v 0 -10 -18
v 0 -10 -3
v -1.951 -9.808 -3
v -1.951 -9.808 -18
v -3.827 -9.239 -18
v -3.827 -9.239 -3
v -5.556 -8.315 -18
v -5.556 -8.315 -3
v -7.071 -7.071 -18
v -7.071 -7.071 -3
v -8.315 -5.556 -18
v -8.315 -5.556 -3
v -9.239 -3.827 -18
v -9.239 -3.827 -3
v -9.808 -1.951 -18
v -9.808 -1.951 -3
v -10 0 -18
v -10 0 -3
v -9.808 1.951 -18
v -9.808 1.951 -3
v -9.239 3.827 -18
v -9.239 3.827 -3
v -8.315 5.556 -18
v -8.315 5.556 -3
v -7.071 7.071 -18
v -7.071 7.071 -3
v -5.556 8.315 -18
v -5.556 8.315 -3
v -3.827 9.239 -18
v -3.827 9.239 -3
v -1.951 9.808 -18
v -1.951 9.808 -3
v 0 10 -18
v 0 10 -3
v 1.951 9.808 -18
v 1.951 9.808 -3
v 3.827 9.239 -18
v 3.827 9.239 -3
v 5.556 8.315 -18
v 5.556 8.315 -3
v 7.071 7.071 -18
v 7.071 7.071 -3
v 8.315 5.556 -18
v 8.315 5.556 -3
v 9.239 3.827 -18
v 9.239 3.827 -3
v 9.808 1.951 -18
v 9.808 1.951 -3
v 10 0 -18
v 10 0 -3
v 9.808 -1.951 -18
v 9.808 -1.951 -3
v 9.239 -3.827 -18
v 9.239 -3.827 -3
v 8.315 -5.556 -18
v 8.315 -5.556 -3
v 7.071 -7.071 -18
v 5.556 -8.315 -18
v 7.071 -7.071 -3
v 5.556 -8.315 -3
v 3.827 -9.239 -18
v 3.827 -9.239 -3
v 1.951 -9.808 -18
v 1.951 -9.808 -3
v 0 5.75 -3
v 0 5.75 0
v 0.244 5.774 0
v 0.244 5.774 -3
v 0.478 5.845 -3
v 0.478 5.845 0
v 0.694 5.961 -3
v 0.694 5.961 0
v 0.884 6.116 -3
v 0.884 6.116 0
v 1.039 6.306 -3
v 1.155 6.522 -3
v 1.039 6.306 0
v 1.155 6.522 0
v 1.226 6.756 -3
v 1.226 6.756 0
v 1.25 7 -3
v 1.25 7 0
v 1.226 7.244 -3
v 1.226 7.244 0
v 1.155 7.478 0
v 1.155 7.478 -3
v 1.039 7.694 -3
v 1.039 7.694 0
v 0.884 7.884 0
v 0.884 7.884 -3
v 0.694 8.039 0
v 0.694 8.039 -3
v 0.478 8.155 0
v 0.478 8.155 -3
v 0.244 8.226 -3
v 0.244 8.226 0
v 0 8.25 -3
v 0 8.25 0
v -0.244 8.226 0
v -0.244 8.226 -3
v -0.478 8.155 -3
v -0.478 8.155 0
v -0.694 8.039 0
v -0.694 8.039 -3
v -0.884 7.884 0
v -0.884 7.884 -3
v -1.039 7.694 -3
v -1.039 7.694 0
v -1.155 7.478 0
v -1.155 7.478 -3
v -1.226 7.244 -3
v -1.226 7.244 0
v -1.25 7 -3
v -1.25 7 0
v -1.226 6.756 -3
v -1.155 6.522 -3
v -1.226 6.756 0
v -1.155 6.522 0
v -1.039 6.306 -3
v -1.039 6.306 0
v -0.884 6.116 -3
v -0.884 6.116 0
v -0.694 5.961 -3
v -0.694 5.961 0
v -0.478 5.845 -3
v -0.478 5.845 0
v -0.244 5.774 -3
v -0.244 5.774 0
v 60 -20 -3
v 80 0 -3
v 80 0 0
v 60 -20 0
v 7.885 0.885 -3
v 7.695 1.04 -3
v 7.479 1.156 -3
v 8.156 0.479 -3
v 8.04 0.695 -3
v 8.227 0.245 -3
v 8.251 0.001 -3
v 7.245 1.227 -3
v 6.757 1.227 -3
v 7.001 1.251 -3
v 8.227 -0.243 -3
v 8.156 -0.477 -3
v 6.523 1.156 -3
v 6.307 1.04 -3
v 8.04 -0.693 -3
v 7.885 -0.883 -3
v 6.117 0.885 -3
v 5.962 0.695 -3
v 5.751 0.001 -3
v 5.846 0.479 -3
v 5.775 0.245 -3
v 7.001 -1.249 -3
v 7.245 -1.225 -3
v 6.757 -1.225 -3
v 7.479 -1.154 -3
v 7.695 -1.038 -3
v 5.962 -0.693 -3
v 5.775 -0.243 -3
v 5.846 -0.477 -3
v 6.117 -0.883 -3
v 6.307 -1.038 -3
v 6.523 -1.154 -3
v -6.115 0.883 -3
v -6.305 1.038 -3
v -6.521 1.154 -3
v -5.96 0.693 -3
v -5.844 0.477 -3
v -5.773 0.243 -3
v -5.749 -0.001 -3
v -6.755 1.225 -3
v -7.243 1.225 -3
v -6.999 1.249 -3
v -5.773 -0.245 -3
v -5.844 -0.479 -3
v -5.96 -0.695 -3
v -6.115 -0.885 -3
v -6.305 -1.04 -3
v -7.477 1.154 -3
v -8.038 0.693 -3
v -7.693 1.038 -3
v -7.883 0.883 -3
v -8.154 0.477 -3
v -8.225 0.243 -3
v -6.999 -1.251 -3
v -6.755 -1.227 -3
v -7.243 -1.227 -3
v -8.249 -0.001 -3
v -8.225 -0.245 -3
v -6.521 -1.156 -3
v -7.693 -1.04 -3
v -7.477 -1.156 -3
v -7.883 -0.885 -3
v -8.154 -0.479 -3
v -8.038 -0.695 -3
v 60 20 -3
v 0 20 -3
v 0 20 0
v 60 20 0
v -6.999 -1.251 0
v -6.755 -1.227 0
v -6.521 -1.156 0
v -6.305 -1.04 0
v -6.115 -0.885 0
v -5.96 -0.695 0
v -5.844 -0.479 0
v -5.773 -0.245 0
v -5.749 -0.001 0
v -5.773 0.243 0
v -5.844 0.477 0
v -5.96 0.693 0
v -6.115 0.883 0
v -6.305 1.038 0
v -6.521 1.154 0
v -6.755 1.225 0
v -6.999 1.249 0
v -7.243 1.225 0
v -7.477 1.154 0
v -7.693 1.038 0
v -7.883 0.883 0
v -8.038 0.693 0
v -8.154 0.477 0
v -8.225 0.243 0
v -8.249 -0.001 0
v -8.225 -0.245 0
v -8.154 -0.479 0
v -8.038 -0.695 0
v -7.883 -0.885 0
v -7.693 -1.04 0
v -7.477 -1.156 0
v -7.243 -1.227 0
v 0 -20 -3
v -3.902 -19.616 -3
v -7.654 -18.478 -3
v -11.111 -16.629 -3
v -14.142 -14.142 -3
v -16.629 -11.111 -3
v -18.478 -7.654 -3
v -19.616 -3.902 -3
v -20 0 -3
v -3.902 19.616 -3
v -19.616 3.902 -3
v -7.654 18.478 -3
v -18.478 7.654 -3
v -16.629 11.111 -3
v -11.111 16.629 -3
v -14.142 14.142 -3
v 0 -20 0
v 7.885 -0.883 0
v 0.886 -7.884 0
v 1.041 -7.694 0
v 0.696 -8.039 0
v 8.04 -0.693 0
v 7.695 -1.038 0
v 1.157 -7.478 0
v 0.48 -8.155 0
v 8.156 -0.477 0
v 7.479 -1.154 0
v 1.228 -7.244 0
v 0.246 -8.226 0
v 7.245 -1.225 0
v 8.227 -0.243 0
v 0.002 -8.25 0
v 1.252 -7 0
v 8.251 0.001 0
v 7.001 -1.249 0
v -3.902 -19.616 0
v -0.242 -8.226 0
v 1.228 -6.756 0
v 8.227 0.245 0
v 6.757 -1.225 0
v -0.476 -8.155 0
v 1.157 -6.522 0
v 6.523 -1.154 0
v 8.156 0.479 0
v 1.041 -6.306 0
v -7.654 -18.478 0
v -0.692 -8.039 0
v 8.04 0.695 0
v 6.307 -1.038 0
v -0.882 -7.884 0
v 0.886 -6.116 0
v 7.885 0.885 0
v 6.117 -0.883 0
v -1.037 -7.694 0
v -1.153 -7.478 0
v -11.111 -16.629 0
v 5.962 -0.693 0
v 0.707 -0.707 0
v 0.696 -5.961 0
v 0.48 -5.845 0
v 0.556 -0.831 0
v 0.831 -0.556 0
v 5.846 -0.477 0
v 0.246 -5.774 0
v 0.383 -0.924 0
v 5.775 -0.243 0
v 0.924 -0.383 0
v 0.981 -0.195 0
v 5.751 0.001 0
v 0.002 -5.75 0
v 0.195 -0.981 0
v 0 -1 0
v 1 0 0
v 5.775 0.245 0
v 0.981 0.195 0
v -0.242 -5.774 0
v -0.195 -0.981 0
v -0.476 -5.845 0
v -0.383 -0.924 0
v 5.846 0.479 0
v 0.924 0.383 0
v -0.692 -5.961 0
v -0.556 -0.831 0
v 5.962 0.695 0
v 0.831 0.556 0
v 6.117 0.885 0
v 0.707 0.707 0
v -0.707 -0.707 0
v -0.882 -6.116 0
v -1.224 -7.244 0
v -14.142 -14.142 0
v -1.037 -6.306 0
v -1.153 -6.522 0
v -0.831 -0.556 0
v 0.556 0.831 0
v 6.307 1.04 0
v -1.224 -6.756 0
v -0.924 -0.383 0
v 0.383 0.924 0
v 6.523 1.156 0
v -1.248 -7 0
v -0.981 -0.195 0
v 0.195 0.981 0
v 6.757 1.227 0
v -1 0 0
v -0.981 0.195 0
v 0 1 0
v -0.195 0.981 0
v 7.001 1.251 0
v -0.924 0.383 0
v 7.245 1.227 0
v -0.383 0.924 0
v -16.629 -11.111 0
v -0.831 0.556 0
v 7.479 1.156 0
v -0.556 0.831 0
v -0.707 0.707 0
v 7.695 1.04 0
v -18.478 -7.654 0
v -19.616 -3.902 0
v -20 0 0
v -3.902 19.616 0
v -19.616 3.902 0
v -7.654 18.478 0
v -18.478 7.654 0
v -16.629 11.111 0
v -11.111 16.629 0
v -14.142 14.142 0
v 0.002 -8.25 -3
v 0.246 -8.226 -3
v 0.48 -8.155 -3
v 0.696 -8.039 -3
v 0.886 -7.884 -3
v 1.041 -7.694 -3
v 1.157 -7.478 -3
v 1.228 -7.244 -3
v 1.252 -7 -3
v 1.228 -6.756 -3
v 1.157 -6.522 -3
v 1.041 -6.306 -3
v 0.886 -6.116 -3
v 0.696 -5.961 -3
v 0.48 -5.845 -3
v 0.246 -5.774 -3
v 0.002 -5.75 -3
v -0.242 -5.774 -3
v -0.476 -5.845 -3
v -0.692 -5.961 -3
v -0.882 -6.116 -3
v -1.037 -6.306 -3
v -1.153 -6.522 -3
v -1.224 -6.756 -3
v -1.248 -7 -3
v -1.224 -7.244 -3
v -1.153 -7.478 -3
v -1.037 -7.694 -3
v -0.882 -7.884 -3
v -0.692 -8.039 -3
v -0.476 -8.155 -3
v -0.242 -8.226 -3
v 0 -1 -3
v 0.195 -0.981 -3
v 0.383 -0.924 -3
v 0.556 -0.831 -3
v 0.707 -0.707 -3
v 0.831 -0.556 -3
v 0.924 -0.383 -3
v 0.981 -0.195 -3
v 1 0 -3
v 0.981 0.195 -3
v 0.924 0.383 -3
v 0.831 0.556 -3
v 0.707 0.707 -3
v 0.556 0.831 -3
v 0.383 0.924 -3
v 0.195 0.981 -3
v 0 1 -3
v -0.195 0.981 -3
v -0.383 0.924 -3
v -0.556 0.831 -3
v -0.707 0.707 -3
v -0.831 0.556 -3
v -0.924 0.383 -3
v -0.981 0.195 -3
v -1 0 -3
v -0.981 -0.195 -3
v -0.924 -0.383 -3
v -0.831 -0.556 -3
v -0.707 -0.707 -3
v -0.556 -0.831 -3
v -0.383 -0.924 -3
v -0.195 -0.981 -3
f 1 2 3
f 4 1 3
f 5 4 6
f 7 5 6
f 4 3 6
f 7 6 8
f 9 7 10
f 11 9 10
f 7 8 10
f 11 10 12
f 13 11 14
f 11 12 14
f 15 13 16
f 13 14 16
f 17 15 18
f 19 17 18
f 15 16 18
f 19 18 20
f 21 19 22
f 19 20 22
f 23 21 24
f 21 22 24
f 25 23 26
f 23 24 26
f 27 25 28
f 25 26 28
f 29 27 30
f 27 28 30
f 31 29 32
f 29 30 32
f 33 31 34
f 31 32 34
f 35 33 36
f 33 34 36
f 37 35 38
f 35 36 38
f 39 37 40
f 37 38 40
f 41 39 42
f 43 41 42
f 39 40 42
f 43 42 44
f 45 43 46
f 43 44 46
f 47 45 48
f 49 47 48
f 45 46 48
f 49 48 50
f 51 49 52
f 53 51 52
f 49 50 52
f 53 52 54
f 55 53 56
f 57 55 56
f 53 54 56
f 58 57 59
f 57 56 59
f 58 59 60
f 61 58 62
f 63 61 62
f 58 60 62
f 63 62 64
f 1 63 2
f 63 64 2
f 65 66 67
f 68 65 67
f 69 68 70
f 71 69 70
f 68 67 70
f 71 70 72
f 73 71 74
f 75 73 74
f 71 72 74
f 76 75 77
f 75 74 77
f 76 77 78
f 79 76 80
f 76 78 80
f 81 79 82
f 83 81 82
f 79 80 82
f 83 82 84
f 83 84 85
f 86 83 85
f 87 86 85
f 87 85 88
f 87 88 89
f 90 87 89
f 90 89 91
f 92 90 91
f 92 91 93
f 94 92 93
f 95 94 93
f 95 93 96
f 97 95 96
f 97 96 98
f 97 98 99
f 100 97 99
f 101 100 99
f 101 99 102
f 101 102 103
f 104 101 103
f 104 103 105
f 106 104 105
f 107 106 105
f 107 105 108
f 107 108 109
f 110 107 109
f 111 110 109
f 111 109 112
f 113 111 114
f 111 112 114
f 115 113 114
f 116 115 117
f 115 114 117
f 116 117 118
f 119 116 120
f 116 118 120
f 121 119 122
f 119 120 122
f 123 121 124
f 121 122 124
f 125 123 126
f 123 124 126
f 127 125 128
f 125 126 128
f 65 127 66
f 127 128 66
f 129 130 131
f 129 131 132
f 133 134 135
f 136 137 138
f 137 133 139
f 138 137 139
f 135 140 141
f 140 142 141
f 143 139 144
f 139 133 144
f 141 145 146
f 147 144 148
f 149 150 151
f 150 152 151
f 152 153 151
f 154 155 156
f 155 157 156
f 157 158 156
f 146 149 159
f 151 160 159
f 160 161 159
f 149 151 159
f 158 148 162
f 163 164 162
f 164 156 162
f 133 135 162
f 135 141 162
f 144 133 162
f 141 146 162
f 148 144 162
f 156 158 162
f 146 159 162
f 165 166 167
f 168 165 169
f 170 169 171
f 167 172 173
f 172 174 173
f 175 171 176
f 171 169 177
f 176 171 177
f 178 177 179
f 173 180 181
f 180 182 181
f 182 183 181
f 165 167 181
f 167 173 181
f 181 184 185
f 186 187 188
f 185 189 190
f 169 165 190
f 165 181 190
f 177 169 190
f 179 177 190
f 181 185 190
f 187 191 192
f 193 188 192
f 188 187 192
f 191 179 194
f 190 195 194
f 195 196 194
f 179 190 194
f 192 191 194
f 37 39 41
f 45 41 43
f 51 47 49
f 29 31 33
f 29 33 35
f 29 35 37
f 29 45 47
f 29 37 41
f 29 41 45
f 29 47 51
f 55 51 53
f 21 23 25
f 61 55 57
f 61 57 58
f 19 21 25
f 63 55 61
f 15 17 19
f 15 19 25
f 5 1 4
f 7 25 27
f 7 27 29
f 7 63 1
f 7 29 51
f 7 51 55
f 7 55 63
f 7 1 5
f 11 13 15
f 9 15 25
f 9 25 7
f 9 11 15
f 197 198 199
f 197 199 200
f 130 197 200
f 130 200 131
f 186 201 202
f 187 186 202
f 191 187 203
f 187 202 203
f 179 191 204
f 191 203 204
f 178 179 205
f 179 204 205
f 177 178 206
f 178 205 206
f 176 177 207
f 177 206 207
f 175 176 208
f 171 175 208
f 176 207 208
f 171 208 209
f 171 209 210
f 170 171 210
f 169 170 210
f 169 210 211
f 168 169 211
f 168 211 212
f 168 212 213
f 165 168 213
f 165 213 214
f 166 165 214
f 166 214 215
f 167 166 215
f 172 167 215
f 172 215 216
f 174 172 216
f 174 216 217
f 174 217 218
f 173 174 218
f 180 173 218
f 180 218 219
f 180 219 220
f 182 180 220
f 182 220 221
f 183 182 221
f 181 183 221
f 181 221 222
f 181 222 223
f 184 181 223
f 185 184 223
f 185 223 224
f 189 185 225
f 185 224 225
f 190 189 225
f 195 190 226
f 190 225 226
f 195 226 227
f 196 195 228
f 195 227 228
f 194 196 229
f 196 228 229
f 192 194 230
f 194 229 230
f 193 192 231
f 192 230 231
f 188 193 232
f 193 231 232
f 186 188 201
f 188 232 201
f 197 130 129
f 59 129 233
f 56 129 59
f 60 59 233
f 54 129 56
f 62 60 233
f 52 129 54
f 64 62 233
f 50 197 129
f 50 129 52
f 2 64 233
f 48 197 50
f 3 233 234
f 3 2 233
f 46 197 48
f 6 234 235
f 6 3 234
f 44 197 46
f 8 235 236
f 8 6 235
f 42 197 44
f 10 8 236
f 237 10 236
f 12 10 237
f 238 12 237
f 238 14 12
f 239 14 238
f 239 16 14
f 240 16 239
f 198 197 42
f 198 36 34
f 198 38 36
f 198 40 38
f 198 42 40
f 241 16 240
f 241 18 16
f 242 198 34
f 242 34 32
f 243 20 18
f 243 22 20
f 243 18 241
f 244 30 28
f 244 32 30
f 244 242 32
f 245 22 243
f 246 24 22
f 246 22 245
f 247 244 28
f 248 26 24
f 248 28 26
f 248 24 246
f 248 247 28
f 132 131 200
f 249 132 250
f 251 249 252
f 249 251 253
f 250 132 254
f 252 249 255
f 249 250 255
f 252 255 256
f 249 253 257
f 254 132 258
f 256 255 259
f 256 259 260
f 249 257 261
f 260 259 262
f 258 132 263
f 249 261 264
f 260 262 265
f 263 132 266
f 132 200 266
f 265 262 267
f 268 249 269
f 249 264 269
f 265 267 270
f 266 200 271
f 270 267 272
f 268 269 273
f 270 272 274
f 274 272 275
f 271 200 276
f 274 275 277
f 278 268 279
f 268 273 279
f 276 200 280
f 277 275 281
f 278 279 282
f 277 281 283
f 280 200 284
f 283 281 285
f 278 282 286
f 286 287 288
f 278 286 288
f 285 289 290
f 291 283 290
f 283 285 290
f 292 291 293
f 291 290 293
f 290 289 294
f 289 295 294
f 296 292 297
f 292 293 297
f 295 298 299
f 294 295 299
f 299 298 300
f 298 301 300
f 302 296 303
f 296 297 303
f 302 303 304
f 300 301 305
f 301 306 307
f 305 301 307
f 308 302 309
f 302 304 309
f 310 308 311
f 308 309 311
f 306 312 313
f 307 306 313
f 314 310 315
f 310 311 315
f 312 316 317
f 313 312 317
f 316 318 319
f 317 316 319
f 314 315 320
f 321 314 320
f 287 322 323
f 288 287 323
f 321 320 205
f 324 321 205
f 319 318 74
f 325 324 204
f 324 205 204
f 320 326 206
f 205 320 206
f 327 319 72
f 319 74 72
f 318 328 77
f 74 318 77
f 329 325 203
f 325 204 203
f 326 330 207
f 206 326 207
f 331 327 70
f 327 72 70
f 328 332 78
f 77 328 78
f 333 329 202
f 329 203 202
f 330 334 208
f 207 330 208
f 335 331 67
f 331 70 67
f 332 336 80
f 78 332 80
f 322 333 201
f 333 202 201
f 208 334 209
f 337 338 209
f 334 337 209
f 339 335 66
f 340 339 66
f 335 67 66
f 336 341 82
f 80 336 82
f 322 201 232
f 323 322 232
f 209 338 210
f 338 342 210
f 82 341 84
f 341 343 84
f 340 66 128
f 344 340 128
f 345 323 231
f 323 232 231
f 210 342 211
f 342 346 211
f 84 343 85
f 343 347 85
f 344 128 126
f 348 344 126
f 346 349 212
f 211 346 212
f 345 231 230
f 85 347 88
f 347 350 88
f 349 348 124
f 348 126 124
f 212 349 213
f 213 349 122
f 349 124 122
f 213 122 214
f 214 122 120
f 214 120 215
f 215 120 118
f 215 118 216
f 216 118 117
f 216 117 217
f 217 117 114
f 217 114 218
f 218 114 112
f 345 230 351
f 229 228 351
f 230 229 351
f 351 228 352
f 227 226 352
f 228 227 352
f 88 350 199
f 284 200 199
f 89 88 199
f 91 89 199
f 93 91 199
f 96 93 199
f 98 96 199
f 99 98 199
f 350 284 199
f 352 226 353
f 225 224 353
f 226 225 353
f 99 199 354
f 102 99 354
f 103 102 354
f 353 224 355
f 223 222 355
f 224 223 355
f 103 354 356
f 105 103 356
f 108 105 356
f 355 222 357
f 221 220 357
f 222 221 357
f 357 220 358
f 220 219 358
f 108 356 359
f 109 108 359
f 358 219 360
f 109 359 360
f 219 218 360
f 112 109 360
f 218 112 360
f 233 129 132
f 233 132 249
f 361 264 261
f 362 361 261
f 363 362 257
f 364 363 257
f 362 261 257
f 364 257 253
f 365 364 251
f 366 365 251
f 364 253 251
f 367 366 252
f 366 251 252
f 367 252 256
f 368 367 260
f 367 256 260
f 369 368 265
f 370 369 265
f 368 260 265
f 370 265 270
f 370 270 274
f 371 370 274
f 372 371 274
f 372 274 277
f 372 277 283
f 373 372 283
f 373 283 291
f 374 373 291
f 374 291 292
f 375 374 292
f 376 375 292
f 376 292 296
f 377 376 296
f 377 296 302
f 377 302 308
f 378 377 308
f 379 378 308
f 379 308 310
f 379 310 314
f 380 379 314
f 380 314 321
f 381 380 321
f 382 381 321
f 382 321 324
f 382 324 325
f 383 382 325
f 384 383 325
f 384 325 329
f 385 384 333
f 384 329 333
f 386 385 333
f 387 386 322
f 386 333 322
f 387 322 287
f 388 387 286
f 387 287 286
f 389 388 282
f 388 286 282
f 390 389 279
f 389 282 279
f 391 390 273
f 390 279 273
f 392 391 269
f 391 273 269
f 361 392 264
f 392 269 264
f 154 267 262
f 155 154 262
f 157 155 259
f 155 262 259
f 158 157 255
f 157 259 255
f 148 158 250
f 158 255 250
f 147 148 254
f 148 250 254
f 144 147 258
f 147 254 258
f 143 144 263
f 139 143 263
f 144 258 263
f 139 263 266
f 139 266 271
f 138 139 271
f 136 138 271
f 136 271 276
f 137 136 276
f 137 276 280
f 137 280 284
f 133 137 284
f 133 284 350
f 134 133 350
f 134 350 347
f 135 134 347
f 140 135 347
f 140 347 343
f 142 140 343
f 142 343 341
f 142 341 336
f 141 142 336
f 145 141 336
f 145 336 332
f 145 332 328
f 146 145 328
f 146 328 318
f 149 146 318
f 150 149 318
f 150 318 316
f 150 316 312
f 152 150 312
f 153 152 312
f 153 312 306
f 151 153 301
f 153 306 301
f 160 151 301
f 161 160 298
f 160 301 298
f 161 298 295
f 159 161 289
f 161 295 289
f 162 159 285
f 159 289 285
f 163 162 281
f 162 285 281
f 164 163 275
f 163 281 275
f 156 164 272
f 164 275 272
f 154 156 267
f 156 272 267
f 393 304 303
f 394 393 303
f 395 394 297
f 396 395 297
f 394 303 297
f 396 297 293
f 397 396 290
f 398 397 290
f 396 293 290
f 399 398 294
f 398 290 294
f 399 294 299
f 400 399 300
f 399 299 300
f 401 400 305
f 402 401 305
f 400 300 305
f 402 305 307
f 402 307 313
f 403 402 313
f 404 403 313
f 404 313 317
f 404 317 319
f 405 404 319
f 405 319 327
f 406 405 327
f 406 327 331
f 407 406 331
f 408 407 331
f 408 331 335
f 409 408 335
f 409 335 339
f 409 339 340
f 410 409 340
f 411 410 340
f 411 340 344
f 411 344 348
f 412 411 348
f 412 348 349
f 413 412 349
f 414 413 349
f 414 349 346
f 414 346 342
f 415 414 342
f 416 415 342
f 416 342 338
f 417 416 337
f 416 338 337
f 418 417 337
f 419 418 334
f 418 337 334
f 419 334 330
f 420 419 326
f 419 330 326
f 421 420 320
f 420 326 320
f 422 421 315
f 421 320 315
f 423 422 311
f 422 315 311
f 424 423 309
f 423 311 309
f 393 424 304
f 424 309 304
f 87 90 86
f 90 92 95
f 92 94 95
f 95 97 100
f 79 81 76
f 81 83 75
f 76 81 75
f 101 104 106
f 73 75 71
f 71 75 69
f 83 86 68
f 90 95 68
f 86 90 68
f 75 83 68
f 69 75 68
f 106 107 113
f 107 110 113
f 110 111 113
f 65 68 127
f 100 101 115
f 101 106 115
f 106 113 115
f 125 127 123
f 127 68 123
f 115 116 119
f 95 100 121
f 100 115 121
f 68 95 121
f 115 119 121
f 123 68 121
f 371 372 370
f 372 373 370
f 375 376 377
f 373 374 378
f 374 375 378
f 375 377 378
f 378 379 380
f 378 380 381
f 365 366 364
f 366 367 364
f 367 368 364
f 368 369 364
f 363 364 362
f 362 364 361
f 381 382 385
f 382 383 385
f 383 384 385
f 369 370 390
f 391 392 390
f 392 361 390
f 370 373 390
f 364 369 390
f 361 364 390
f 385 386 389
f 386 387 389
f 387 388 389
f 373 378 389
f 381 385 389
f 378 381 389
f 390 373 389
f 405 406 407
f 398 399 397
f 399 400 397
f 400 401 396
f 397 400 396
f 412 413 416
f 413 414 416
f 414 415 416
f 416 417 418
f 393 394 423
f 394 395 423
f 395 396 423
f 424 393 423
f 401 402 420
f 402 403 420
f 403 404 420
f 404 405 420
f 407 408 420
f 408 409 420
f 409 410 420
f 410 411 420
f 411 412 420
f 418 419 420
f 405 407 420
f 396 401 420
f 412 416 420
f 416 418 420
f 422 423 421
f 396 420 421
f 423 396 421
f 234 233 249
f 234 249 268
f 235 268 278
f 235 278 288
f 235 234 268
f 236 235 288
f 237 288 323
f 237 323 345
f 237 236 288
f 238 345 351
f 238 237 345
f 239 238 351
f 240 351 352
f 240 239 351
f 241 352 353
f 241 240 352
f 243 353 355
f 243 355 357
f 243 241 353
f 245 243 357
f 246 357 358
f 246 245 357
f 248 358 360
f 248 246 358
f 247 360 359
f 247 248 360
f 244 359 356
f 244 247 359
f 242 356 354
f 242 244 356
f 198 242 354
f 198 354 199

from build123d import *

# Parameters (mm, degrees)
BOSS_EXTRUDE1_DEPTH   = 3
CUT_EXTRUDE1_REACH    = 84.517
SKETCH2_R             = 1
SKETCH2_R_2           = 1.25
SKETCH3_R             = 10
BOSS_EXTRUDE2_DEPTH   = 15
BODY_MOVE_COPY2_ANGLE = 90


with BuildPart() as part:
    # Sketch1 → Boss-Extrude1 (new body)
    with BuildSketch(Plane(origin=(0, 0, 0), x_dir=(1, 0, 0), z_dir=(0, 1, 0))):
        with BuildLine():
            Line((60, -20), (0, -20))
            ThreePointArc((0, -20), (-20, 0), (0, 20))
            Line((0, 20), (60, 20))
            Line((60, 20), (80, 0))
            Line((80, 0), (60, -20))
        make_face()
    extrude(amount=BOSS_EXTRUDE1_DEPTH)

    # Sketch2 → Cut-Extrude1 (cut, up to next)
    with BuildSketch(Plane(origin=(0, 3, 0), x_dir=(1, 0, 0), z_dir=(0, 1, 0)), mode=Mode.PRIVATE) as cut_extrude1_sk1:
        with Locations(Location((0, 0, 0), (0, 0, 270))):
            Circle(SKETCH2_R)
    cut_extrude1_tool1 = extrude(cut_extrude1_sk1.sketch, amount=-CUT_EXTRUDE1_REACH, mode=Mode.PRIVATE) & part.part
    # Sketch2 → Cut-Extrude1 (cut, up to next)
    with BuildSketch(Plane(origin=(0, 3, 0), x_dir=(1, 0, 0), z_dir=(0, 1, 0)), mode=Mode.PRIVATE) as cut_extrude1_sk2:
        with Locations(Location((0, 7, 0), (0, 0, 270))):
            Circle(SKETCH2_R_2)
    cut_extrude1_tool2 = extrude(cut_extrude1_sk2.sketch, amount=-CUT_EXTRUDE1_REACH, mode=Mode.PRIVATE) & part.part
    # Sketch2 → Cut-Extrude1 (cut, up to next)
    with BuildSketch(Plane(origin=(0, 3, 0), x_dir=(1, 0, 0), z_dir=(0, 1, 0)), mode=Mode.PRIVATE) as cut_extrude1_sk3:
        with Locations(Location((7.001, 0.001, 0), (0, 0, 270))):
            Circle(SKETCH2_R_2)
    cut_extrude1_tool3 = extrude(cut_extrude1_sk3.sketch, amount=-CUT_EXTRUDE1_REACH, mode=Mode.PRIVATE) & part.part
    # Sketch2 → Cut-Extrude1 (cut, up to next)
    with BuildSketch(Plane(origin=(0, 3, 0), x_dir=(1, 0, 0), z_dir=(0, 1, 0)), mode=Mode.PRIVATE) as cut_extrude1_sk4:
        with Locations(Location((0.002, -7, 0), (0, 0, 270))):
            Circle(SKETCH2_R_2)
    cut_extrude1_tool4 = extrude(cut_extrude1_sk4.sketch, amount=-CUT_EXTRUDE1_REACH, mode=Mode.PRIVATE) & part.part
    # Sketch2 → Cut-Extrude1 (cut, up to next)
    with BuildSketch(Plane(origin=(0, 3, 0), x_dir=(1, 0, 0), z_dir=(0, 1, 0)), mode=Mode.PRIVATE) as cut_extrude1_sk5:
        with Locations(Location((-6.999, -0.001, 0), (0, 0, 270))):
            Circle(SKETCH2_R_2)
    cut_extrude1_tool5 = extrude(cut_extrude1_sk5.sketch, amount=-CUT_EXTRUDE1_REACH, mode=Mode.PRIVATE) & part.part
    add(cut_extrude1_tool1.solids().sort_by_distance((0, 3, 0))[0], mode=Mode.SUBTRACT)
    add(cut_extrude1_tool2.solids().sort_by_distance((0, 3, -7))[0], mode=Mode.SUBTRACT)
    add(cut_extrude1_tool3.solids().sort_by_distance((7.001, 3, -0.001))[0], mode=Mode.SUBTRACT)
    add(cut_extrude1_tool4.solids().sort_by_distance((0.002, 3, 7))[0], mode=Mode.SUBTRACT)
    add(cut_extrude1_tool5.solids().sort_by_distance((-6.999, 3, 0.001))[0], mode=Mode.SUBTRACT)

    # Sketch3 → Boss-Extrude2 (add)
    with BuildSketch(Plane.XZ):
        with Locations(Location((0, 0, 0), (0, 0, 90))):
            Circle(SKETCH3_R)
    extrude(amount=BOSS_EXTRUDE2_DEPTH)


with BuildPart() as part_1:
    # Body-Move/Copy2: moved
    add(part.part.rotate(Axis((0, 0, 0), (1, 0, 0)), BODY_MOVE_COPY2_ANGLE))


with BuildPart() as part_2:
    # Body-Move/Copy3: moved
    add(part_1.part.moved(Location((0, 0, -3))))


solid = part_2.part
